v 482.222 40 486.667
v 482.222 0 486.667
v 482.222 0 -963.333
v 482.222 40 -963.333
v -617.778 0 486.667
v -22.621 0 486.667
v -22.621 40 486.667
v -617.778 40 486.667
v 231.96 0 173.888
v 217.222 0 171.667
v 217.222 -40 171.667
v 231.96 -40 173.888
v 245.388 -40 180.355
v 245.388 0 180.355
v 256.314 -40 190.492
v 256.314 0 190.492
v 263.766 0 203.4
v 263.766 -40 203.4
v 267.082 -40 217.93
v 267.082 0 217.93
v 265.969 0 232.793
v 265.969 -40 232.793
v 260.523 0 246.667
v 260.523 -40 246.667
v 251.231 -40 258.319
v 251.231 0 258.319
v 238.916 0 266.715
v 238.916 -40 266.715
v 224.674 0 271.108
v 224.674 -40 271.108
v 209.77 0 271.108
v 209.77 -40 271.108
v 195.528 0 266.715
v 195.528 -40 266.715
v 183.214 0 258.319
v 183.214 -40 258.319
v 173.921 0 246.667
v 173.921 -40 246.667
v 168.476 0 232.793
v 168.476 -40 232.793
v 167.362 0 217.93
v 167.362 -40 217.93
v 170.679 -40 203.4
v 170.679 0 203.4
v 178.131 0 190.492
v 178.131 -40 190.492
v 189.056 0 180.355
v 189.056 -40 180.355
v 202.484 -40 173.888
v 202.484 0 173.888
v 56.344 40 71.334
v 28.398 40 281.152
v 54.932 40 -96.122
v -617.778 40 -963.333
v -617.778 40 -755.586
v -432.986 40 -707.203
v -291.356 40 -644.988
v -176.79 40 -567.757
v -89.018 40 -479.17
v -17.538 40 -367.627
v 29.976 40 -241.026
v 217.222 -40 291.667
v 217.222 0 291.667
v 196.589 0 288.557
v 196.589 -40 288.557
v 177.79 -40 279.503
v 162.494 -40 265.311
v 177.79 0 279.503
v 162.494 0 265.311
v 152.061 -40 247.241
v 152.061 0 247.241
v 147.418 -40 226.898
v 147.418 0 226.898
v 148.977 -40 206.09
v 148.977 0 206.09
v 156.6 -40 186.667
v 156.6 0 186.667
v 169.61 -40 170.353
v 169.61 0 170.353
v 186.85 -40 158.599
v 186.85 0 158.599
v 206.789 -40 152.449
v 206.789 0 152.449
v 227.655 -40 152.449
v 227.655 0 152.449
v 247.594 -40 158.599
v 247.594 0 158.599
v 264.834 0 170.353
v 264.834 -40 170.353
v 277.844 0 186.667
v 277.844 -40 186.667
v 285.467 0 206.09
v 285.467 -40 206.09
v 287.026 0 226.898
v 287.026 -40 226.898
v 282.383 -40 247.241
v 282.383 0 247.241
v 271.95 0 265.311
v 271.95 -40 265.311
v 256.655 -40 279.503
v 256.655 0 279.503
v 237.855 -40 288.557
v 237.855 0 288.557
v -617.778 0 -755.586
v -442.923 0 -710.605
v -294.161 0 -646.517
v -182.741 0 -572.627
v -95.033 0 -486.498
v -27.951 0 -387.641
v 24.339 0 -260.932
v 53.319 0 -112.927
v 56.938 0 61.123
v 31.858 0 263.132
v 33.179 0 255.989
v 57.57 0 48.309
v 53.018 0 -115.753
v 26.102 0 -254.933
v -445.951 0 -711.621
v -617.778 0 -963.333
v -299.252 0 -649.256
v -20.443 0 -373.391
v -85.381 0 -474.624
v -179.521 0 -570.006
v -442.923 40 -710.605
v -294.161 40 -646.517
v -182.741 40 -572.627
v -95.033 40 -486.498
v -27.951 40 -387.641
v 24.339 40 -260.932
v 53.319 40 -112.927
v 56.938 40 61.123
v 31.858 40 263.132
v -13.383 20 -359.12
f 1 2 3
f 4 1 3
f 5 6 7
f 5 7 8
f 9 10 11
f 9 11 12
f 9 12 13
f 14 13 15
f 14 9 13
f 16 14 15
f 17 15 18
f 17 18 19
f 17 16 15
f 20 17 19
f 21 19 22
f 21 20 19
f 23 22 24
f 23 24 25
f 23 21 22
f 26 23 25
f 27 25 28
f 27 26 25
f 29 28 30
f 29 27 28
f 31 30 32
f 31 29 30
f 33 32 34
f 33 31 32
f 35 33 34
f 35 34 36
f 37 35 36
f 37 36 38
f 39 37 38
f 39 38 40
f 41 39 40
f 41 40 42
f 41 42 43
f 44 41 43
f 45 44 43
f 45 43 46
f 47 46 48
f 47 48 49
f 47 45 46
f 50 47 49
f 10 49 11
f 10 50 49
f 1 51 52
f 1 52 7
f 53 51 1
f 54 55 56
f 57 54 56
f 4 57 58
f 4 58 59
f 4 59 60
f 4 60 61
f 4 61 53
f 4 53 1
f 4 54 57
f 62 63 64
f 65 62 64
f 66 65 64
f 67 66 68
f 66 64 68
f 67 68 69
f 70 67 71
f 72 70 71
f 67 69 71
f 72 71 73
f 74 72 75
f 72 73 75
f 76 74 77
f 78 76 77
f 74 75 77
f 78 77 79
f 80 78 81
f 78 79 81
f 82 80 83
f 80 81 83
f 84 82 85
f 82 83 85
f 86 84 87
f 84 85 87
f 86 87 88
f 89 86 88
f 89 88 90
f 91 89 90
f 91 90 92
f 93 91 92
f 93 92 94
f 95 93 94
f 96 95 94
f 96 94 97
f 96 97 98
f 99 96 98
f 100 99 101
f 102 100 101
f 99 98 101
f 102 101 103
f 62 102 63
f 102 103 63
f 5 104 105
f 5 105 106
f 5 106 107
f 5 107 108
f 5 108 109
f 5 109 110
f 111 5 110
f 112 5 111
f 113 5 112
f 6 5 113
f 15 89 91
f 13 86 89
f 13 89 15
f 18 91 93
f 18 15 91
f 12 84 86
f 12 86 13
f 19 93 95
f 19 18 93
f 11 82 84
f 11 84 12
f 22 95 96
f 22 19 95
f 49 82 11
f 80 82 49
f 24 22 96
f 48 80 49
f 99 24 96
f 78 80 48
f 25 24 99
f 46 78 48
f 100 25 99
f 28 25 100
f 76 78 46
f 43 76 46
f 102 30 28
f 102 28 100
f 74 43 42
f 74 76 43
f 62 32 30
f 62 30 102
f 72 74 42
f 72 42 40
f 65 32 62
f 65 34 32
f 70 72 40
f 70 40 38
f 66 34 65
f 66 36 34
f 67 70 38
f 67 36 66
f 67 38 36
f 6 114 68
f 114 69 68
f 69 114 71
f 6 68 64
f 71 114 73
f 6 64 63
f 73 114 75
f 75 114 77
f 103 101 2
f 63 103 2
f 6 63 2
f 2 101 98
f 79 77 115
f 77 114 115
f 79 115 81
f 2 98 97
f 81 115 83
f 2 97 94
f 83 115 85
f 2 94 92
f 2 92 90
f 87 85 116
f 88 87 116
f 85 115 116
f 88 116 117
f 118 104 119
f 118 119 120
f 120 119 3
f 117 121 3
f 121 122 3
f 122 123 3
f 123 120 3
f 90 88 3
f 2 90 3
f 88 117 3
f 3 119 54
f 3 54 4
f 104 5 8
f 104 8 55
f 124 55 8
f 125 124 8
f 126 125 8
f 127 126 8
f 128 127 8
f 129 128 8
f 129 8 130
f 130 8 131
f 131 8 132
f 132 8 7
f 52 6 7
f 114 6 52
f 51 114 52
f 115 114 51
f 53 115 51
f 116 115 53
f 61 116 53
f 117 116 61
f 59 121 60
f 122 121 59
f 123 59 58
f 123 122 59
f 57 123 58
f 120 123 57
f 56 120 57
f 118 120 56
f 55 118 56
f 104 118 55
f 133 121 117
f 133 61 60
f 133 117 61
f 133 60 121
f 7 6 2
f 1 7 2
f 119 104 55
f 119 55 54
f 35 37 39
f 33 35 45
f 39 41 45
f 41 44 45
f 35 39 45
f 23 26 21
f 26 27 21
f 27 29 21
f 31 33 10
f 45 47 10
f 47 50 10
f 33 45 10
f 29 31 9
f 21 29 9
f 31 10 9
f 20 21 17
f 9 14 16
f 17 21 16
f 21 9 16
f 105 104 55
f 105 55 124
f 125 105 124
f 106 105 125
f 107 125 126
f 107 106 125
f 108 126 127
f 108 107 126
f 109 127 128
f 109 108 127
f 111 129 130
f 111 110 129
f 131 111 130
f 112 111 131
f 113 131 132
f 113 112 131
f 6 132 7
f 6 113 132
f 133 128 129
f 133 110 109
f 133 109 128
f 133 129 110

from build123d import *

# Parameters (mm, degrees)
SKETCH1_W           = 1100
SKETCH1_H           = 1450
BOSS_EXTRUDE1_DEPTH = 40
SKETCH2_R           = 70
SKETCH2_R_2         = 50
BOSS_EXTRUDE2_DEPTH = 40
CUT_EXTRUDE1_DEPTH  = 1020
BOSS_EXTRUDE3_DEPTH = 40


with BuildPart() as part:
    # Sketch1 → Boss-Extrude1 (new body)
    with BuildSketch(Plane(origin=(0, 0, 0), x_dir=(1, 0, 0), z_dir=(0, 1, 0))):
        with Locations((-67.777777778, 238.333333333)):
            Rectangle(SKETCH1_W, SKETCH1_H)
    extrude(amount=BOSS_EXTRUDE1_DEPTH)

    # Sketch2 → Boss-Extrude2 (add)
    with BuildSketch(Plane.XZ):
        with Locations(Location((217.222222222, 221.666666667, 0), (0, 0, 90))):
            Circle(SKETCH2_R)
        with Locations(Location((217.222222222, 221.666666667, 0), (0, 0, 270))):
            Circle(SKETCH2_R_2, mode=Mode.SUBTRACT)
    extrude(amount=BOSS_EXTRUDE2_DEPTH)

    # Sketch6 → Cut-Extrude1 (cut)
    with BuildSketch(Plane.XZ):
        with BuildLine():
            Line((-617.777777778, -238.333333333), (-617.777777778, -755.586382029))
            add(Edge.make_bspline(
                [(-22.62076559, 486.666666667), (293.432590218, -583.780996804), (-617.777777778, -755.586382029)],
                knots=[0, 0, 0, 1, 1, 1], degree=2))
            Line((-22.62076559, 486.666666667), (-617.777777778, 486.666666667))
            Line((-617.777777778, 486.666666667), (-617.777777778, -238.333333333))
        make_face()
    extrude(amount=-CUT_EXTRUDE1_DEPTH, mode=Mode.SUBTRACT)


with BuildPart() as body_2:
    # Sketch8 → Boss-Extrude3 (new body)
    with BuildSketch(Plane.XZ):
        with BuildLine():
            Line((-22.62076559, 486.666666666), (-617.777777778, 486.666666667))
            Line((-617.777777778, 486.666666667), (-617.777777777, -755.586382029))
            add(Edge.make_bspline(
                [(-617.777777777, -755.586382029), (293.432590218, -583.780996804), (-22.62076559, 486.666666666)],
                knots=[0, 0, 0, 1, 1, 1], degree=2))
        make_face()
    extrude(amount=-BOSS_EXTRUDE3_DEPTH)


solid = Compound([part.part, body_2.part])
